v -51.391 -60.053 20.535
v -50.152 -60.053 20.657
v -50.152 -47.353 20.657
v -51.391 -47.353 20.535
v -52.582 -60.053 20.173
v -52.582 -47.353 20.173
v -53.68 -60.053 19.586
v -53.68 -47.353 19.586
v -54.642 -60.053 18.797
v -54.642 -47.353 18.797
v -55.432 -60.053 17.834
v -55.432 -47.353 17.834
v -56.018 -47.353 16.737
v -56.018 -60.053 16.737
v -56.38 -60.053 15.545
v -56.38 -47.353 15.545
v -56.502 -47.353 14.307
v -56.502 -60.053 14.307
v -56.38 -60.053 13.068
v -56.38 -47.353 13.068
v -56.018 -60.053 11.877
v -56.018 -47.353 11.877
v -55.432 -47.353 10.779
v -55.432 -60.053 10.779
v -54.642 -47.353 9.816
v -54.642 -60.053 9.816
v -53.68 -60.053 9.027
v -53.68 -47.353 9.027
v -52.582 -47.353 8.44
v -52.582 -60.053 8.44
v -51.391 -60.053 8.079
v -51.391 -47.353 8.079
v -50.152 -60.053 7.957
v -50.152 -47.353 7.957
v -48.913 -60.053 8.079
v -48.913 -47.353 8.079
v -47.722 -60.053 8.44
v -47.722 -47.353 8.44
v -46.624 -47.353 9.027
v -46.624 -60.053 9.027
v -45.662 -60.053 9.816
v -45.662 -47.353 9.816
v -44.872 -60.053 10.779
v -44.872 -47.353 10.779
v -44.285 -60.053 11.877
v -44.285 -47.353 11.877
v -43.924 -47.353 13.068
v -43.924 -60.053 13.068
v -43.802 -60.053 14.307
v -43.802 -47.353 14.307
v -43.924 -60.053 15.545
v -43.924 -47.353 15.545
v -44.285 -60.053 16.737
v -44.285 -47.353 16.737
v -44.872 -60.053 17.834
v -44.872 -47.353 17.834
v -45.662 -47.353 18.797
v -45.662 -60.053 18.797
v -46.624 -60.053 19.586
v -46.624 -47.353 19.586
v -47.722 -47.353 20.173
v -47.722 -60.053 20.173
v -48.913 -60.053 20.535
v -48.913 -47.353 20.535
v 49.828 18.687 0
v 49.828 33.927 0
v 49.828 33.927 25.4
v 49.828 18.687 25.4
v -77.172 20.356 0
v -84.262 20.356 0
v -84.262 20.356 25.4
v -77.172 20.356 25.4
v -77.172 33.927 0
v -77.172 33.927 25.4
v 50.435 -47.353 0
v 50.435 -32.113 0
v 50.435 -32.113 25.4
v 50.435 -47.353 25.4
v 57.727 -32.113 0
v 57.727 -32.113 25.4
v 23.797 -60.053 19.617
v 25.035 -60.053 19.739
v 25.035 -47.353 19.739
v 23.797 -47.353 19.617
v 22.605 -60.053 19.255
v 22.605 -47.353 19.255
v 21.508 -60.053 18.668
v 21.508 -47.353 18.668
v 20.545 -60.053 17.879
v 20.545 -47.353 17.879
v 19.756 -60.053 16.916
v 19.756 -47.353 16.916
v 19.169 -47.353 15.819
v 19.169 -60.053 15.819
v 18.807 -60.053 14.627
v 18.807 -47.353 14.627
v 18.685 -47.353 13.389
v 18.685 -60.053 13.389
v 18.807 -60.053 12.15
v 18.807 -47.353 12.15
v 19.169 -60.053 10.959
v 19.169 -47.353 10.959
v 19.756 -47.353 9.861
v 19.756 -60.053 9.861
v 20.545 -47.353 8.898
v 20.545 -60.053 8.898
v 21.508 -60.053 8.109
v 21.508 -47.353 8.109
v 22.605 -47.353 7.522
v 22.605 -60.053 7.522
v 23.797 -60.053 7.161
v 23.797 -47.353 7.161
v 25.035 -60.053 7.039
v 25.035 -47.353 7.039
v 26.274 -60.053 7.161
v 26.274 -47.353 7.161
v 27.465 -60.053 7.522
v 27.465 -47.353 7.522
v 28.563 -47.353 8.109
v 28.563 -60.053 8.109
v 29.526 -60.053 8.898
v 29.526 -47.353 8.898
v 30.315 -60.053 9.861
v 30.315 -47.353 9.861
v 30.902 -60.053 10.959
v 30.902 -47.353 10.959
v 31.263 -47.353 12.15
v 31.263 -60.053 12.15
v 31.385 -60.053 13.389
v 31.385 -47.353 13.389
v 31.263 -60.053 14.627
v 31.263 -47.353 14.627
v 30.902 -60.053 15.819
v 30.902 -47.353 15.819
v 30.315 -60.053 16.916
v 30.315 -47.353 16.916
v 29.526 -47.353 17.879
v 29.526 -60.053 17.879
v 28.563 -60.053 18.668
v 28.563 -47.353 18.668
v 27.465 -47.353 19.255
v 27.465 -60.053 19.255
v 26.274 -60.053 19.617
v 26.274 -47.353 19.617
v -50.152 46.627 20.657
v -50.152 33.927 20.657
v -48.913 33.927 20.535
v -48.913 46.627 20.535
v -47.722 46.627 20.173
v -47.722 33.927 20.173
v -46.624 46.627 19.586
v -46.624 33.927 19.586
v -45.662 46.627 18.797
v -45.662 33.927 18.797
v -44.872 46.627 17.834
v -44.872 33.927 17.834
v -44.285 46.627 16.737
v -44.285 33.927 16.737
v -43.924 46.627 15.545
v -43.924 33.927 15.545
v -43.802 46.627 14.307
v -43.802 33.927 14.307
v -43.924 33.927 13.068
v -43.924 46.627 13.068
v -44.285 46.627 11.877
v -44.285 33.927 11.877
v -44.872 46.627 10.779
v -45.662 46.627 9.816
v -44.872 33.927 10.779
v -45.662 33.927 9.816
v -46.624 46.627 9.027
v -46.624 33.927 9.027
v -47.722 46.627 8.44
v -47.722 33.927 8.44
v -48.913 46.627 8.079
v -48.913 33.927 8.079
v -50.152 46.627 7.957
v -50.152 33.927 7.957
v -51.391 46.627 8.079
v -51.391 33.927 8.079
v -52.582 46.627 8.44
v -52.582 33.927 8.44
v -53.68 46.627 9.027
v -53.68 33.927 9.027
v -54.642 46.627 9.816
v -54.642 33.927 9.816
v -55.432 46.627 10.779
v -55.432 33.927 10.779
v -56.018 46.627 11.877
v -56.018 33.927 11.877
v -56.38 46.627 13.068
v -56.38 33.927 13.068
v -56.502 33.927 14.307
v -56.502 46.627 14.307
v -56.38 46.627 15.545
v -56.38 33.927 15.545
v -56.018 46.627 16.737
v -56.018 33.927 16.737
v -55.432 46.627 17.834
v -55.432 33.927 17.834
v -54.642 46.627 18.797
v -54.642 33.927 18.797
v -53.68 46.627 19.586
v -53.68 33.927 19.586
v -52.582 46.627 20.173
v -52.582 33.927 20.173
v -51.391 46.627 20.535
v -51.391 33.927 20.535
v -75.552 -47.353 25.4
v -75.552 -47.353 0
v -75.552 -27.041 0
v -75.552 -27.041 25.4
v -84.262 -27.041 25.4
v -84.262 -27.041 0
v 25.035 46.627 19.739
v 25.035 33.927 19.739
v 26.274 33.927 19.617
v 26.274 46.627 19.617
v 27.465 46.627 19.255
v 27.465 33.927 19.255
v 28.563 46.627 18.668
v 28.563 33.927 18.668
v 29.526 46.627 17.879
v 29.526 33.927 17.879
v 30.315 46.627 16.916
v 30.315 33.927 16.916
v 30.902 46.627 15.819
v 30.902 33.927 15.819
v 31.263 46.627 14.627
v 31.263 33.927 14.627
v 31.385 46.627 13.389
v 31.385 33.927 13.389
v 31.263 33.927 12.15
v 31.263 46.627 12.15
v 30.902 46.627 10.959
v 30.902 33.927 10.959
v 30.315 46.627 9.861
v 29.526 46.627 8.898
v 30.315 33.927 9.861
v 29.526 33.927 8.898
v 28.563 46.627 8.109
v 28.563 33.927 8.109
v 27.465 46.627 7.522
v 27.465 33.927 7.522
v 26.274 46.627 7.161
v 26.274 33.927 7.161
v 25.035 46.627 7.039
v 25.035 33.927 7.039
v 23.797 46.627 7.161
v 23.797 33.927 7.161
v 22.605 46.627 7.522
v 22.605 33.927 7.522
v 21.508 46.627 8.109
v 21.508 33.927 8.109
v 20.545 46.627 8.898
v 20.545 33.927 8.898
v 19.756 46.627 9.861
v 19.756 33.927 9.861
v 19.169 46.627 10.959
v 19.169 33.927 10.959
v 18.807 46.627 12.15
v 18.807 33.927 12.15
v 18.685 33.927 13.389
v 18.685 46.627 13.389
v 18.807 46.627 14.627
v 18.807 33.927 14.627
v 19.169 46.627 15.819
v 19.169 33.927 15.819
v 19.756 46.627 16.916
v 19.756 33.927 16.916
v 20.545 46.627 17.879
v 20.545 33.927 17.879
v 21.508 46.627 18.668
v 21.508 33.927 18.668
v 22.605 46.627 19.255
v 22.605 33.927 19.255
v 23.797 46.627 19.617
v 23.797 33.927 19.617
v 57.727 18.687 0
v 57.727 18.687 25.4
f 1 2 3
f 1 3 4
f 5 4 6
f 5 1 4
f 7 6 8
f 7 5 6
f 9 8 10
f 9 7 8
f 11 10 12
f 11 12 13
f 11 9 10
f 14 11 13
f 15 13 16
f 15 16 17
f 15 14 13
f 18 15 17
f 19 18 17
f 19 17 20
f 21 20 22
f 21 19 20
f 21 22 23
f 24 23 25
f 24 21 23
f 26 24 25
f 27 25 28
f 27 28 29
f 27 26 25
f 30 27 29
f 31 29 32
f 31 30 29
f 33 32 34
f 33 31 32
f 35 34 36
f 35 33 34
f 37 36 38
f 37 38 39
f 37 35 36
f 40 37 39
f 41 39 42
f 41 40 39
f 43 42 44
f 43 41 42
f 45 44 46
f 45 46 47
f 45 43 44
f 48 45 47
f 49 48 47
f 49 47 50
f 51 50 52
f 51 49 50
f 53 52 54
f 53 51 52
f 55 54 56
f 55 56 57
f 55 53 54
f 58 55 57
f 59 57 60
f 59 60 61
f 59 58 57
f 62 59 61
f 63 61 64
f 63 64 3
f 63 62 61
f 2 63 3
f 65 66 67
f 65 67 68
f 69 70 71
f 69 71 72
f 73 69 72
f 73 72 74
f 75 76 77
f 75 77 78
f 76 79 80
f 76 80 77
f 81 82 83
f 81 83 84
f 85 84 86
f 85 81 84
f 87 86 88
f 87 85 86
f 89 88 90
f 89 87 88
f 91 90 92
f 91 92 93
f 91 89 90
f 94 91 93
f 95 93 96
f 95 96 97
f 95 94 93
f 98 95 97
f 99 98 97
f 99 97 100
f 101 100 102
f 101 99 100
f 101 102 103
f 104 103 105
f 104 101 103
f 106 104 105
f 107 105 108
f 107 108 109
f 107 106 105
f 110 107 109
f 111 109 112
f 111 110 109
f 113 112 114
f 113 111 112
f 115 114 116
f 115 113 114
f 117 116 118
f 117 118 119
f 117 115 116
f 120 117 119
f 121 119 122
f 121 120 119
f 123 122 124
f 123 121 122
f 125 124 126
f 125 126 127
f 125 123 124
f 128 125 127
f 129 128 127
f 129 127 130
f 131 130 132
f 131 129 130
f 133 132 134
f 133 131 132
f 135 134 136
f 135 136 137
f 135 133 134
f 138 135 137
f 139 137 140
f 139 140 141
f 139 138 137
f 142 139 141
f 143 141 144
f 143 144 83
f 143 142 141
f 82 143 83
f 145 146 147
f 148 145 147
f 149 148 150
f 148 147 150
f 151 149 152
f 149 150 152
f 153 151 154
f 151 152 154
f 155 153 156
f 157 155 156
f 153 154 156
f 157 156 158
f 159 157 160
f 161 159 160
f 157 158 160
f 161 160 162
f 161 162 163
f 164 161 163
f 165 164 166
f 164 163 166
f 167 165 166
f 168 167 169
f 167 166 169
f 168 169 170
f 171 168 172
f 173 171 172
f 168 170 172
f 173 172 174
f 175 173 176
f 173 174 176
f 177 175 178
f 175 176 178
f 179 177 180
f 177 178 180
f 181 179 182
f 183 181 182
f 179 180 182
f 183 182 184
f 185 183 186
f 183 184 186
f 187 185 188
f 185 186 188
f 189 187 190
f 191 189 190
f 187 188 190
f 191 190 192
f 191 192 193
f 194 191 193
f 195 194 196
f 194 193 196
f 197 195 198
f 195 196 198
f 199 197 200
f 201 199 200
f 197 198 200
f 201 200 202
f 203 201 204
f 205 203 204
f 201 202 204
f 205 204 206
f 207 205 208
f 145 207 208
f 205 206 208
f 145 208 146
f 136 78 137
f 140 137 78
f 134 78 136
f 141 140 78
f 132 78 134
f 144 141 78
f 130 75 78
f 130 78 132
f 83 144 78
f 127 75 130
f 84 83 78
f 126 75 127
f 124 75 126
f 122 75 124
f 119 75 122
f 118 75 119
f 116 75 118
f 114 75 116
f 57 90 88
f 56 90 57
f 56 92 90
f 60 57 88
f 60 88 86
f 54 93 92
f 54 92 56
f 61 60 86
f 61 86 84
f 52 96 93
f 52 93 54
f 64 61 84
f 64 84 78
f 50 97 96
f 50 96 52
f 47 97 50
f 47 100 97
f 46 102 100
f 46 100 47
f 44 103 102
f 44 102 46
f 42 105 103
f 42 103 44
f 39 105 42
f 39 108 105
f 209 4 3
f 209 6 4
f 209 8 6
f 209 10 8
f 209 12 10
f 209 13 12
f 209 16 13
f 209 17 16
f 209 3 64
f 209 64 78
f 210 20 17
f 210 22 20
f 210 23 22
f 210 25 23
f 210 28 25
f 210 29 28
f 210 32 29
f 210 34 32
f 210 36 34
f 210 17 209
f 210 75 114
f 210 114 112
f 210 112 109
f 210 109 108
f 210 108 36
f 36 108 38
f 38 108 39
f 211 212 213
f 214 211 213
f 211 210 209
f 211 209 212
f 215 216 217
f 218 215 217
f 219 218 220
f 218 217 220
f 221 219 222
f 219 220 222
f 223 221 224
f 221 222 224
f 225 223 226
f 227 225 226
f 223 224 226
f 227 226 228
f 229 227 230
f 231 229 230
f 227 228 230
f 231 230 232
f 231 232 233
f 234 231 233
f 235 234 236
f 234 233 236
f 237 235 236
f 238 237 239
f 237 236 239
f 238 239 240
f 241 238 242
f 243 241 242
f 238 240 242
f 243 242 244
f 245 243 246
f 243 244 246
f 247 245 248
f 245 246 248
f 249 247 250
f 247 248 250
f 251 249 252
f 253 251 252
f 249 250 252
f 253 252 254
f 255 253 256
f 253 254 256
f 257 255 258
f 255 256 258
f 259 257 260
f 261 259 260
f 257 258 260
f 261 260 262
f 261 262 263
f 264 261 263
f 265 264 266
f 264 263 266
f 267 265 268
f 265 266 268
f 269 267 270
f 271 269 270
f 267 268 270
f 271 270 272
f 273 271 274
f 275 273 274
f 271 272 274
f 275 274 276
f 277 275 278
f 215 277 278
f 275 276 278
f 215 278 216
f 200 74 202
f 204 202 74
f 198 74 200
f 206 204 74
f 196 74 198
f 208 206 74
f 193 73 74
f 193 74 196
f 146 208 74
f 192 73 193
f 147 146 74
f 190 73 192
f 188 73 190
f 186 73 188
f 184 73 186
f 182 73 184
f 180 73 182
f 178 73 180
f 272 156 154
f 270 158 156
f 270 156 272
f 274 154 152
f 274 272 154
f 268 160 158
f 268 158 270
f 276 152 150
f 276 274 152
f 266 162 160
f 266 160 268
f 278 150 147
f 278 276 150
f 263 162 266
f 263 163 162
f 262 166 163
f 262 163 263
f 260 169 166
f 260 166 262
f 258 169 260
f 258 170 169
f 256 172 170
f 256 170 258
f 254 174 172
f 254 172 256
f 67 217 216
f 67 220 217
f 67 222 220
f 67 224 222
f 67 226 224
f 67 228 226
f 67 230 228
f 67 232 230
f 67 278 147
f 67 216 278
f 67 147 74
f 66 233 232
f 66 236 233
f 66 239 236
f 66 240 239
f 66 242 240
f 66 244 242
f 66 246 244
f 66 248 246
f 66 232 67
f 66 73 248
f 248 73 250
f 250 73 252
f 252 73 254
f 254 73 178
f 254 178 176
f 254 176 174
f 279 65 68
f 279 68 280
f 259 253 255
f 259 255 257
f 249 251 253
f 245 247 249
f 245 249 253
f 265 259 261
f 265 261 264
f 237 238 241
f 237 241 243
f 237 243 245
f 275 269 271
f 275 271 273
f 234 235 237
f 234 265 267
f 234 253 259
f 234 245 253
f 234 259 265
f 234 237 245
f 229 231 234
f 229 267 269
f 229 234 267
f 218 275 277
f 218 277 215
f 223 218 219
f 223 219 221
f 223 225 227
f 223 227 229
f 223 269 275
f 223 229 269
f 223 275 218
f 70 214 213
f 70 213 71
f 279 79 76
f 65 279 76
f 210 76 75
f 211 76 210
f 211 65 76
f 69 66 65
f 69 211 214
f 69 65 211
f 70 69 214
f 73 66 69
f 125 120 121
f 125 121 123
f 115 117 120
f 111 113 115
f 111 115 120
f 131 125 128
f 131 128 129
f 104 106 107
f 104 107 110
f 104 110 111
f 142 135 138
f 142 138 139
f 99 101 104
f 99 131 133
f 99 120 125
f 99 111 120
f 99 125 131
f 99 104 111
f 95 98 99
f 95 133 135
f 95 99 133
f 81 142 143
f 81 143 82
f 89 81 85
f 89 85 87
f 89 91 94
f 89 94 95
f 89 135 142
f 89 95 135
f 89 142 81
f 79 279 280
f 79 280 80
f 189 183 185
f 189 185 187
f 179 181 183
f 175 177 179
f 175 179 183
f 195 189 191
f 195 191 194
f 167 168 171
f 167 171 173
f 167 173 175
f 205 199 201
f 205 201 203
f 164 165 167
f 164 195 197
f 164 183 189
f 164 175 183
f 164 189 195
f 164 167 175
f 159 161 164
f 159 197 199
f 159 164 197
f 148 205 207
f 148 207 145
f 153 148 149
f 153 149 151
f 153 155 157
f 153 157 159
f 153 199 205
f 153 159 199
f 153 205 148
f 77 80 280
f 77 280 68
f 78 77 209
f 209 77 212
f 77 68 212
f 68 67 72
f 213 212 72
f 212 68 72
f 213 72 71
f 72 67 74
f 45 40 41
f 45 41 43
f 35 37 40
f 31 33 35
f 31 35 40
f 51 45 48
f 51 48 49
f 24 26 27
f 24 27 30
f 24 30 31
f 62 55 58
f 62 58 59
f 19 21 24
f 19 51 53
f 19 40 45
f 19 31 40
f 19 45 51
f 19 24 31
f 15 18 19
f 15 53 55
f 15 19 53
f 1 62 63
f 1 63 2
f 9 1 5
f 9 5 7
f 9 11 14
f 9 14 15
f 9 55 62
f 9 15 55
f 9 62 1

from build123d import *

# Parameters (mm, degrees)
BOSS_EXTRUDE1_DEPTH = 25.4
SKETCH4_R           = 6.35
BOSS_EXTRUDE2_DEPTH = 12.7
BOSS_EXTRUDE3_START = 12.7
SKETCH2_R           = 6.35
BOSS_EXTRUDE3_DEPTH = 12.7


with BuildPart() as part:
    # Sketch1 → Boss-Extrude1 (new body)
    with BuildSketch(Plane.XY):
        Polygon((-77.172248804, 33.927432217), (49.827751196, 33.927432217), (49.827751196, 18.687432217), (57.727272727, 18.687432217), (57.727272727, -32.112567783), (50.435406699, -32.112567783), (50.435406699, -47.352567783), (-75.551834131, -47.352567783), (-75.551834131, -27.040669856), (-84.261562998, -27.040669856), (-84.261562998, 20.35645933), (-77.172248804, 20.35645933), align=None)
    extrude(amount=BOSS_EXTRUDE1_DEPTH)

    # Sketch4 → Boss-Extrude2 (add)
    with BuildSketch(Plane(origin=(0, 33.927432217, 0), x_dir=(1, 0, 0), z_dir=(0, 1, 0))):
        with Locations(Location((-50.151834131, -14.306606111, 0), (0, 0, 270))):
            Circle(SKETCH4_R)
        with Locations(Location((25.035406699, -13.388545476, 0), (0, 0, 270))):
            Circle(SKETCH4_R)
    extrude(amount=BOSS_EXTRUDE2_DEPTH)

    # Sketch2 → Boss-Extrude3 (add)
    with BuildSketch(Plane.XZ.offset(47.352567783).offset(BOSS_EXTRUDE3_START)):
        with Locations(Location((-50.151834131, 14.306606111, 0), (0, 0, 90))):
            Circle(SKETCH2_R)
        with Locations(Location((25.035406699, 13.388545476, 0), (0, 0, 90))):
            Circle(SKETCH2_R)
    extrude(amount=-BOSS_EXTRUDE3_DEPTH)


solid = part.part
